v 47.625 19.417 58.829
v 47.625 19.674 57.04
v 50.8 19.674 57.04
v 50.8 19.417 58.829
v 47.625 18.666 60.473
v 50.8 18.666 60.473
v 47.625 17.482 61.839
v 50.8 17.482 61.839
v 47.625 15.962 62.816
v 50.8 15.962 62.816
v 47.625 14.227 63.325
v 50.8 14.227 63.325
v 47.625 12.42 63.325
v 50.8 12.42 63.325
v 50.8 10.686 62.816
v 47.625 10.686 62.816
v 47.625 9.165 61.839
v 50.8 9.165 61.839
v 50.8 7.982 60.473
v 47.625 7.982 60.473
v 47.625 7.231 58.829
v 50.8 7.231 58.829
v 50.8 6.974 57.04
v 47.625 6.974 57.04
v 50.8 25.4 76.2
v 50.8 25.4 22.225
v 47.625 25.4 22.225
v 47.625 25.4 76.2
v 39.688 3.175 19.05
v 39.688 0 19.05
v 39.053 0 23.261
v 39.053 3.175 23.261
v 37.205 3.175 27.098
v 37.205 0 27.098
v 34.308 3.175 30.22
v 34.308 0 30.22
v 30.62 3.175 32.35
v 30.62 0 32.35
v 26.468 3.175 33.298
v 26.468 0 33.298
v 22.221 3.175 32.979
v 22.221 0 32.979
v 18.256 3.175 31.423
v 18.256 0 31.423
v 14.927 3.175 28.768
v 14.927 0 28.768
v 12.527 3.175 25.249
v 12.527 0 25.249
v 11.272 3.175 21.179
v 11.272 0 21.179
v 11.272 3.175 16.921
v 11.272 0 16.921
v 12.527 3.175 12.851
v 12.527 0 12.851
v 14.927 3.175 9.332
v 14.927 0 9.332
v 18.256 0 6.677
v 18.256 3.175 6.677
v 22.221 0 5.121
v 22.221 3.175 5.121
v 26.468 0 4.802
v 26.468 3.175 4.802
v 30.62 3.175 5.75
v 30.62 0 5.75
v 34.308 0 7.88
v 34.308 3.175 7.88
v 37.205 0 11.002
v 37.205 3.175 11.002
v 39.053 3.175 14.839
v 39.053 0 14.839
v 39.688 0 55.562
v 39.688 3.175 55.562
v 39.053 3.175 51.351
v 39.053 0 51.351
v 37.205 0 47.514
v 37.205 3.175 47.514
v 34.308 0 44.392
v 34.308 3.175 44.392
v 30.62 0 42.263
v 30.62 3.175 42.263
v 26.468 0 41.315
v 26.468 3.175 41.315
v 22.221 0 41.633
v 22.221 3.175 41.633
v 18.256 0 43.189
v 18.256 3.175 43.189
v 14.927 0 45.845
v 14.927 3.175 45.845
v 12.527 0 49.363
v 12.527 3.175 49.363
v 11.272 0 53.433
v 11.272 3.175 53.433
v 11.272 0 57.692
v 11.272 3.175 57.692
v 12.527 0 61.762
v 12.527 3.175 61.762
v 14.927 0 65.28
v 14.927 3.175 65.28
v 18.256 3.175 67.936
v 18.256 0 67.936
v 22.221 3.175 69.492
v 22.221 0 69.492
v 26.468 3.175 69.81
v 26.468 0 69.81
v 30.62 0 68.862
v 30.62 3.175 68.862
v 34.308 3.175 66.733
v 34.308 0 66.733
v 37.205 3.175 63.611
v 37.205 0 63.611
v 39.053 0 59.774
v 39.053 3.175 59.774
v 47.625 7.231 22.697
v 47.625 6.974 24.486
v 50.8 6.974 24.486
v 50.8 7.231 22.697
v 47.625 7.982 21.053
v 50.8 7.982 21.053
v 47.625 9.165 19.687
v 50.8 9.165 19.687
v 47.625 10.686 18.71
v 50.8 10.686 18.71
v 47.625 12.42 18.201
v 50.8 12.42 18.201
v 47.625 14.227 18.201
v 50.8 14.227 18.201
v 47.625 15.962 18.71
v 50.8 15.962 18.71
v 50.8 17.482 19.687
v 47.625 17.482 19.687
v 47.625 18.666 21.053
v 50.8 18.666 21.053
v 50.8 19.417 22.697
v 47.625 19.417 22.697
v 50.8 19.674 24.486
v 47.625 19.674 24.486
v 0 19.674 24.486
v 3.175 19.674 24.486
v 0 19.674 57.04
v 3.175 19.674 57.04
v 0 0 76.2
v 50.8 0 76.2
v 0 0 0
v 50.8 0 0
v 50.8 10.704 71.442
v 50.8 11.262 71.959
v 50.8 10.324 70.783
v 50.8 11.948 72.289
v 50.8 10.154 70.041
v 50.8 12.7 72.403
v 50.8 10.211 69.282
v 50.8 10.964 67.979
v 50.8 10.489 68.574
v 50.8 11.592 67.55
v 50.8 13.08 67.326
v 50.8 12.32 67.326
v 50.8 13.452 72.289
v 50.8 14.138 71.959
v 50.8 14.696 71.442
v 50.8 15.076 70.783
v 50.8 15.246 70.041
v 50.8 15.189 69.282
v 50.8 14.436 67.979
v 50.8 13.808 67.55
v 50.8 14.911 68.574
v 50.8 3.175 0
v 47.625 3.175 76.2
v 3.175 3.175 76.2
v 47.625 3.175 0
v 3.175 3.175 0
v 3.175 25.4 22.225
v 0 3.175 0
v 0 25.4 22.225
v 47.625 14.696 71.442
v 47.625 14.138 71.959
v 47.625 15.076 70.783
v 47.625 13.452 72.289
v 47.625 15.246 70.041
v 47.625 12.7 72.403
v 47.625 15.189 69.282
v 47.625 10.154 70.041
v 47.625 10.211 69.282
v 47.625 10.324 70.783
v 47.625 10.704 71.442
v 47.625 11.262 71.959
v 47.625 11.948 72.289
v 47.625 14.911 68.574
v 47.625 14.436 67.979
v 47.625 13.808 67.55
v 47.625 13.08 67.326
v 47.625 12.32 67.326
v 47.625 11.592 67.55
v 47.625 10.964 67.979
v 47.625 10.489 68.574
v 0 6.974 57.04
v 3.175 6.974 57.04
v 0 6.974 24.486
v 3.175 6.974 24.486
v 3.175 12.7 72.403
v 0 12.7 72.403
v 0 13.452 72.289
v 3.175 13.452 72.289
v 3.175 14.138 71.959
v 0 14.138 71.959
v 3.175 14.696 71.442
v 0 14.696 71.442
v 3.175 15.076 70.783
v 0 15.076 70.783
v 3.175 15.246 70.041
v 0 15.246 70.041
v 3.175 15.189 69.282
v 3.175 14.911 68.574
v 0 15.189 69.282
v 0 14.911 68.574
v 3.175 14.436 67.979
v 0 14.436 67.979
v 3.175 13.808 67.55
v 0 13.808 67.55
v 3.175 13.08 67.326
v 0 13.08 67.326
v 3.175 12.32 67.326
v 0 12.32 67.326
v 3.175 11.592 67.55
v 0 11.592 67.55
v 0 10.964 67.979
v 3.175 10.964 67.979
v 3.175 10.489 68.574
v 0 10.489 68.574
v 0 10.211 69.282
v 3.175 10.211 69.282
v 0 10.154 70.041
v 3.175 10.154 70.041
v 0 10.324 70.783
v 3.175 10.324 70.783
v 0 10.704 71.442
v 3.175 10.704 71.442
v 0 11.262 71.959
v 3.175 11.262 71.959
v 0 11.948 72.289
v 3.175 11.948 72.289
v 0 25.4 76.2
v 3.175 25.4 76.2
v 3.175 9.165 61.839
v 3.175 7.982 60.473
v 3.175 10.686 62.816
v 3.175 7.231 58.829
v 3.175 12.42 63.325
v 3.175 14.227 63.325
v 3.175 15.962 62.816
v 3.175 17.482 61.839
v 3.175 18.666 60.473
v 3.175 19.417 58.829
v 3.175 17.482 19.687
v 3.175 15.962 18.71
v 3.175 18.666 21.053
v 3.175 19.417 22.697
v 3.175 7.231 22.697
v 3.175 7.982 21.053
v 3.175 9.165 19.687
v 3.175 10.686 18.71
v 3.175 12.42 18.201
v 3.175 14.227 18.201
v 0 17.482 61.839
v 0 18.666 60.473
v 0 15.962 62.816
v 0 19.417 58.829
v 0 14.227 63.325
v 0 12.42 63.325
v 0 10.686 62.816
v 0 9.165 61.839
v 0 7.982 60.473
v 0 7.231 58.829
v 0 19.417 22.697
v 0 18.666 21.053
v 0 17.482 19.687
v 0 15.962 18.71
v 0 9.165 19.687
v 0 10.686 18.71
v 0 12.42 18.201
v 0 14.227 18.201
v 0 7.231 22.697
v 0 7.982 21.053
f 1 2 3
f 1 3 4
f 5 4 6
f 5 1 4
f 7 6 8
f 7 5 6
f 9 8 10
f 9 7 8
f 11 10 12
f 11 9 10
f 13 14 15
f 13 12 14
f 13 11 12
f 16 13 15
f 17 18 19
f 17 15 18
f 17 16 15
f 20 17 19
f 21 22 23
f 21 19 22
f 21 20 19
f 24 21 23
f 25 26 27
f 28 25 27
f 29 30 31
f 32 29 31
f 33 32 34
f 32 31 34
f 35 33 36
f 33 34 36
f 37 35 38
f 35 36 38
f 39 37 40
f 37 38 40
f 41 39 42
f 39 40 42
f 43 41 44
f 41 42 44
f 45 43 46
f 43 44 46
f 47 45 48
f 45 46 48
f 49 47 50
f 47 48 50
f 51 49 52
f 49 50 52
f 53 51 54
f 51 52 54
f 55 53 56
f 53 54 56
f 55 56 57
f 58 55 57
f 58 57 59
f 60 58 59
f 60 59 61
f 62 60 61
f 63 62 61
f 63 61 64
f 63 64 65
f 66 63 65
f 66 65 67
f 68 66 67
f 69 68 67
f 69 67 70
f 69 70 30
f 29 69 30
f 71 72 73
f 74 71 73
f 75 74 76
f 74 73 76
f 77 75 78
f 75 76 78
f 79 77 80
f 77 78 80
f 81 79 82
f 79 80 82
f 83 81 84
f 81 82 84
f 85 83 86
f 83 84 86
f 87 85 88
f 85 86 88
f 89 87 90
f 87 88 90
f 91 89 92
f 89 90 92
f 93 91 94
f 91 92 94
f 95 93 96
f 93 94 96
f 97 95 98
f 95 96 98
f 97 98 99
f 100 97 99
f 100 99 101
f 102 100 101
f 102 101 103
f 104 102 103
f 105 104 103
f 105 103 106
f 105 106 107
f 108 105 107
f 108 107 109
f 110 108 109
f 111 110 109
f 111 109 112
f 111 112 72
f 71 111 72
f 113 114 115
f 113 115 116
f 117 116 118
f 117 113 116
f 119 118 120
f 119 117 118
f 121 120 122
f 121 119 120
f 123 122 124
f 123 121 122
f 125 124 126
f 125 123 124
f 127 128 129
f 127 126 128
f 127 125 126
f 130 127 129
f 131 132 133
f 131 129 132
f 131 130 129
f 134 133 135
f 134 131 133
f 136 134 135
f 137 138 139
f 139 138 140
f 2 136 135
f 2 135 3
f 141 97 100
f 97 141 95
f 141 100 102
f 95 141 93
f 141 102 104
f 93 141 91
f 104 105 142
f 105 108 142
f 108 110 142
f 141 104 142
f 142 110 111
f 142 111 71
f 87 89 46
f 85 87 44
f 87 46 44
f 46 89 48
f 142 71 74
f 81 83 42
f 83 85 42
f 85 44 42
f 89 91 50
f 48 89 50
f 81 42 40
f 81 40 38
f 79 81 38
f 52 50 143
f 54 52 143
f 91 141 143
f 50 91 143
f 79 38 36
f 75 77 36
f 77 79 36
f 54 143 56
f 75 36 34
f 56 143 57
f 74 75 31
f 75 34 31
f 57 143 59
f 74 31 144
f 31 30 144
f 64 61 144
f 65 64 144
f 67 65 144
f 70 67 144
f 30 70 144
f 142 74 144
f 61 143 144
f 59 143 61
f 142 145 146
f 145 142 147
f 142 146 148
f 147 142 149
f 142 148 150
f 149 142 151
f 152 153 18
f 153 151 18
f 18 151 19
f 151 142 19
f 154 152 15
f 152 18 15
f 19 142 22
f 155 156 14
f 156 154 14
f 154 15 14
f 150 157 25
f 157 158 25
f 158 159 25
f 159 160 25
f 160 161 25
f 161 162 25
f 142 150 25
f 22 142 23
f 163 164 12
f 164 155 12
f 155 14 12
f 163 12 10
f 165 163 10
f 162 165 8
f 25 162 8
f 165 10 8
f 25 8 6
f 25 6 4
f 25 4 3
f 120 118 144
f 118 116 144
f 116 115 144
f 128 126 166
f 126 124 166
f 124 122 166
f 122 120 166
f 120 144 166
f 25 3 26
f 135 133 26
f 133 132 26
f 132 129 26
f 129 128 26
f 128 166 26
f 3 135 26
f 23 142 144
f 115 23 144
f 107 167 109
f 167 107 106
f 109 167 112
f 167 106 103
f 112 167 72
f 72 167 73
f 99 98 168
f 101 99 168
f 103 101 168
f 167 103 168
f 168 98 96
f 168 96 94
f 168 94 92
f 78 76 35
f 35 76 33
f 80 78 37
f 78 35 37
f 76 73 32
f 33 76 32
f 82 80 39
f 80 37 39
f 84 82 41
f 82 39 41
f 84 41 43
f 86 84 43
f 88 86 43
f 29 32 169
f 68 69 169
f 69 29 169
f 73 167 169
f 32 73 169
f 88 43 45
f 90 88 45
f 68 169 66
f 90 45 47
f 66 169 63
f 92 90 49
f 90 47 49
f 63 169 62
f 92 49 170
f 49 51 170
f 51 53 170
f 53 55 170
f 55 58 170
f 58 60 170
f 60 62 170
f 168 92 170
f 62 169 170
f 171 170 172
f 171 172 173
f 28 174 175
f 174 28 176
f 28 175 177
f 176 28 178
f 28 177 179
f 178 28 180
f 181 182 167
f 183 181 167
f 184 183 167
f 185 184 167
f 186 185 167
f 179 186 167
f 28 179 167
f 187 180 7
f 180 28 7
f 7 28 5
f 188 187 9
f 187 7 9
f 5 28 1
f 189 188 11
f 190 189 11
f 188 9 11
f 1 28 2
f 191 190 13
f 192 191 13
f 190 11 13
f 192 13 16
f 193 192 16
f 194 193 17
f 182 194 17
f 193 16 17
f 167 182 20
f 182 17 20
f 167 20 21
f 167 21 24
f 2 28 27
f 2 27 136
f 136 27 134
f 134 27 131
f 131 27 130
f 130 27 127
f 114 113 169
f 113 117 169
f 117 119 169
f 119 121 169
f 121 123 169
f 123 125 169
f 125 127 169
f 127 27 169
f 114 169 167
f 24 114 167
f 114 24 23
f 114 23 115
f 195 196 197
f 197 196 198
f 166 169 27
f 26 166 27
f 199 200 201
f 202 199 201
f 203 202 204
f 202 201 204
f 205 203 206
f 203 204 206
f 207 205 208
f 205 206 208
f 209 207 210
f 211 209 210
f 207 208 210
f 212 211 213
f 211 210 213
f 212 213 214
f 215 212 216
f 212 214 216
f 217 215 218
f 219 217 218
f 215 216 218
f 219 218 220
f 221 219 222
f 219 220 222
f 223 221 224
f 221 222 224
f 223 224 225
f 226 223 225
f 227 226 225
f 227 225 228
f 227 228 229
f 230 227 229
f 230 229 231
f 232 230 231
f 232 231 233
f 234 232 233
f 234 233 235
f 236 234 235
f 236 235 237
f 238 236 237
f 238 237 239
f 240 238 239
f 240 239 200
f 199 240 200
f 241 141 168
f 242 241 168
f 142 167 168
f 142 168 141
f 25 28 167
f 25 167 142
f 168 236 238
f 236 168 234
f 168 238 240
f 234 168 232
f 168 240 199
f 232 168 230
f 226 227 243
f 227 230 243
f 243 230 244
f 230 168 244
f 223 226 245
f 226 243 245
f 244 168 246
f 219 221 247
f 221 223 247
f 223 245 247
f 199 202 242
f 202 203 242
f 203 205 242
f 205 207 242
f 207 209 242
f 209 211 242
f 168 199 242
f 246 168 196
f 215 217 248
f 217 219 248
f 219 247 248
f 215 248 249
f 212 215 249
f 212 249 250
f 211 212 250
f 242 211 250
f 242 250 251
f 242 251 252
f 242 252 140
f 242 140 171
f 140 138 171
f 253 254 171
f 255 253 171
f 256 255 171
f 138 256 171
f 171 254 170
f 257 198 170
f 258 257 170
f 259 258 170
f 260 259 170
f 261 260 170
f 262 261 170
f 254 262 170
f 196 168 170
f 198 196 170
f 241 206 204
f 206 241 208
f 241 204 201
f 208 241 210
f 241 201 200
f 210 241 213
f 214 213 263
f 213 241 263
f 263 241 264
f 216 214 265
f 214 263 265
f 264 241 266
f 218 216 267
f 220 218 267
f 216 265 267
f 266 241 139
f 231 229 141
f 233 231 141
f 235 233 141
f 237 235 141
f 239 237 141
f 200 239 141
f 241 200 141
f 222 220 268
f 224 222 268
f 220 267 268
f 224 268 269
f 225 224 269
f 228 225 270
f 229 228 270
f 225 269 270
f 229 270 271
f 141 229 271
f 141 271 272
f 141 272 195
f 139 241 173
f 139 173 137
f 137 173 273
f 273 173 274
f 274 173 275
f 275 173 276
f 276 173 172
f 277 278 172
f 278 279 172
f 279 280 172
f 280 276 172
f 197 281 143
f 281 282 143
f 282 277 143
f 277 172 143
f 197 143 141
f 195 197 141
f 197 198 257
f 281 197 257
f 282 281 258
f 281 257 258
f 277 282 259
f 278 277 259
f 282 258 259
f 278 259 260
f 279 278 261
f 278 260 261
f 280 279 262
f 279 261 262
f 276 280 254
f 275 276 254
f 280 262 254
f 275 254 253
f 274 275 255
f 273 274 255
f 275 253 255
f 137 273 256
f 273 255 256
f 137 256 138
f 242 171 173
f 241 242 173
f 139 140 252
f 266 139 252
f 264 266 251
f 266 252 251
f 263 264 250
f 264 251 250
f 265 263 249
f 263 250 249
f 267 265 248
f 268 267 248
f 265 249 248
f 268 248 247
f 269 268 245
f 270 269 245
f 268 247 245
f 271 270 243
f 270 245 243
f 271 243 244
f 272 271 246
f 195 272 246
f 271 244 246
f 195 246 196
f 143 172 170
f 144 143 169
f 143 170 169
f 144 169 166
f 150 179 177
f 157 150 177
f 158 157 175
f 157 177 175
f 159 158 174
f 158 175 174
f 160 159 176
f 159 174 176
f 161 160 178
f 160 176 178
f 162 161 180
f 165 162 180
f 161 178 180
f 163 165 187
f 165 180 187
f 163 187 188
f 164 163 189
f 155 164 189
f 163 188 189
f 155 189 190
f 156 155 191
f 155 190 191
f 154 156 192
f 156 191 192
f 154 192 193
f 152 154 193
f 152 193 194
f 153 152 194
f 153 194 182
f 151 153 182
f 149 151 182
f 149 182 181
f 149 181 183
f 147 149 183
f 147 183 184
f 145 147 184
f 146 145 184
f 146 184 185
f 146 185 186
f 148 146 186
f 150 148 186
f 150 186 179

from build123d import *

# Parameters (mm, degrees)
BOSS_EXTRUDE1_DEPTH     = 76.2
CUT_EXTRUDE1_REACH      = 27.4
SKETCH2_R               = 14.2875
SKETCH3_R               = 2.5527
CUT_EXTRUDE2_DEPTH      = 51.8
CUT_EXTRUDE3_DEPTH      = 48.625
CUT_EXTRUDE3_DEPTH_BACK = 4.175
CUT_EXTRUDE4_REACH      = 5.175
SKETCH5_R               = 14.2875
CUT_EXTRUDE5_DEPTH      = 48.625
CUT_EXTRUDE5_DEPTH_BACK = 4.175


with BuildPart() as part:
    # Sketch1 → Boss-Extrude1 (new body)
    with BuildSketch(Plane.XY):
        Polygon((3.175, 3.175), (3.175, 25.4), (0, 25.4), (0, 0), (50.8, 0), (50.8, 25.4), (47.625, 25.4), (47.625, 3.175), align=None)
    extrude(amount=BOSS_EXTRUDE1_DEPTH)

    # Sketch2 → Cut-Extrude1 (cut, up to next)
    with BuildSketch(Plane.XZ, mode=Mode.PRIVATE) as cut_extrude1_sk1:
        with Locations((25.4, 19.05)):
            Circle(SKETCH2_R)
    cut_extrude1_tool1 = extrude(cut_extrude1_sk1.sketch, amount=-CUT_EXTRUDE1_REACH, mode=Mode.PRIVATE) & part.part
    add(cut_extrude1_tool1.solids().sort_by_distance((25.4, 0, 19.05))[0], mode=Mode.SUBTRACT)

    # Sketch3 → Cut-Extrude2 (cut, through all)
    with BuildSketch(Plane.ZY):
        with Locations((69.85, 12.7)):
            Circle(SKETCH3_R)
    extrude(amount=-CUT_EXTRUDE2_DEPTH, mode=Mode.SUBTRACT)

    # Sketch4 → Cut-Extrude3 (cut, two sides)
    with BuildSketch(Plane.ZY.offset(-47.625)) as cut_extrude3_sk:
        Polygon((0, 3.175), (22.225, 25.4), (0, 25.4), align=None)
    extrude(amount=CUT_EXTRUDE3_DEPTH, mode=Mode.SUBTRACT)
    extrude(cut_extrude3_sk.sketch, amount=-CUT_EXTRUDE3_DEPTH_BACK, mode=Mode.SUBTRACT)

    # Sketch5 → Cut-Extrude4 (cut, up to next)
    with BuildSketch(Plane(origin=(0, 3.175, 0), x_dir=(1, 0, 0), z_dir=(0, 1, 0)), mode=Mode.PRIVATE) as cut_extrude4_sk1:
        with Locations((25.4, -55.5625)):
            Circle(SKETCH5_R)
    cut_extrude4_tool1 = extrude(cut_extrude4_sk1.sketch, amount=-CUT_EXTRUDE4_REACH, mode=Mode.PRIVATE) & part.part
    add(cut_extrude4_tool1.solids().sort_by_distance((25.4, 3.175, 55.5625))[0], mode=Mode.SUBTRACT)

    # Sketch6 → Cut-Extrude5 (cut, two sides)
    with BuildSketch(Plane.ZY.offset(-47.625)) as cut_extrude5_sk:
        with BuildLine():
            Line((24.485892943, 19.673757433), (57.04010233, 19.673757433))
            ThreePointArc((57.04010233, 19.673757433), (63.39010233, 13.323757433), (57.04010233, 6.973757433))
            Line((57.04010233, 6.973757433), (24.485892943, 6.973757433))
            ThreePointArc((24.485892943, 6.973757433), (18.135892943, 13.323757433), (24.485892943, 19.673757433))
        make_face()
    extrude(amount=CUT_EXTRUDE5_DEPTH, mode=Mode.SUBTRACT)
    extrude(cut_extrude5_sk.sketch, amount=-CUT_EXTRUDE5_DEPTH_BACK, mode=Mode.SUBTRACT)


solid = part.part
